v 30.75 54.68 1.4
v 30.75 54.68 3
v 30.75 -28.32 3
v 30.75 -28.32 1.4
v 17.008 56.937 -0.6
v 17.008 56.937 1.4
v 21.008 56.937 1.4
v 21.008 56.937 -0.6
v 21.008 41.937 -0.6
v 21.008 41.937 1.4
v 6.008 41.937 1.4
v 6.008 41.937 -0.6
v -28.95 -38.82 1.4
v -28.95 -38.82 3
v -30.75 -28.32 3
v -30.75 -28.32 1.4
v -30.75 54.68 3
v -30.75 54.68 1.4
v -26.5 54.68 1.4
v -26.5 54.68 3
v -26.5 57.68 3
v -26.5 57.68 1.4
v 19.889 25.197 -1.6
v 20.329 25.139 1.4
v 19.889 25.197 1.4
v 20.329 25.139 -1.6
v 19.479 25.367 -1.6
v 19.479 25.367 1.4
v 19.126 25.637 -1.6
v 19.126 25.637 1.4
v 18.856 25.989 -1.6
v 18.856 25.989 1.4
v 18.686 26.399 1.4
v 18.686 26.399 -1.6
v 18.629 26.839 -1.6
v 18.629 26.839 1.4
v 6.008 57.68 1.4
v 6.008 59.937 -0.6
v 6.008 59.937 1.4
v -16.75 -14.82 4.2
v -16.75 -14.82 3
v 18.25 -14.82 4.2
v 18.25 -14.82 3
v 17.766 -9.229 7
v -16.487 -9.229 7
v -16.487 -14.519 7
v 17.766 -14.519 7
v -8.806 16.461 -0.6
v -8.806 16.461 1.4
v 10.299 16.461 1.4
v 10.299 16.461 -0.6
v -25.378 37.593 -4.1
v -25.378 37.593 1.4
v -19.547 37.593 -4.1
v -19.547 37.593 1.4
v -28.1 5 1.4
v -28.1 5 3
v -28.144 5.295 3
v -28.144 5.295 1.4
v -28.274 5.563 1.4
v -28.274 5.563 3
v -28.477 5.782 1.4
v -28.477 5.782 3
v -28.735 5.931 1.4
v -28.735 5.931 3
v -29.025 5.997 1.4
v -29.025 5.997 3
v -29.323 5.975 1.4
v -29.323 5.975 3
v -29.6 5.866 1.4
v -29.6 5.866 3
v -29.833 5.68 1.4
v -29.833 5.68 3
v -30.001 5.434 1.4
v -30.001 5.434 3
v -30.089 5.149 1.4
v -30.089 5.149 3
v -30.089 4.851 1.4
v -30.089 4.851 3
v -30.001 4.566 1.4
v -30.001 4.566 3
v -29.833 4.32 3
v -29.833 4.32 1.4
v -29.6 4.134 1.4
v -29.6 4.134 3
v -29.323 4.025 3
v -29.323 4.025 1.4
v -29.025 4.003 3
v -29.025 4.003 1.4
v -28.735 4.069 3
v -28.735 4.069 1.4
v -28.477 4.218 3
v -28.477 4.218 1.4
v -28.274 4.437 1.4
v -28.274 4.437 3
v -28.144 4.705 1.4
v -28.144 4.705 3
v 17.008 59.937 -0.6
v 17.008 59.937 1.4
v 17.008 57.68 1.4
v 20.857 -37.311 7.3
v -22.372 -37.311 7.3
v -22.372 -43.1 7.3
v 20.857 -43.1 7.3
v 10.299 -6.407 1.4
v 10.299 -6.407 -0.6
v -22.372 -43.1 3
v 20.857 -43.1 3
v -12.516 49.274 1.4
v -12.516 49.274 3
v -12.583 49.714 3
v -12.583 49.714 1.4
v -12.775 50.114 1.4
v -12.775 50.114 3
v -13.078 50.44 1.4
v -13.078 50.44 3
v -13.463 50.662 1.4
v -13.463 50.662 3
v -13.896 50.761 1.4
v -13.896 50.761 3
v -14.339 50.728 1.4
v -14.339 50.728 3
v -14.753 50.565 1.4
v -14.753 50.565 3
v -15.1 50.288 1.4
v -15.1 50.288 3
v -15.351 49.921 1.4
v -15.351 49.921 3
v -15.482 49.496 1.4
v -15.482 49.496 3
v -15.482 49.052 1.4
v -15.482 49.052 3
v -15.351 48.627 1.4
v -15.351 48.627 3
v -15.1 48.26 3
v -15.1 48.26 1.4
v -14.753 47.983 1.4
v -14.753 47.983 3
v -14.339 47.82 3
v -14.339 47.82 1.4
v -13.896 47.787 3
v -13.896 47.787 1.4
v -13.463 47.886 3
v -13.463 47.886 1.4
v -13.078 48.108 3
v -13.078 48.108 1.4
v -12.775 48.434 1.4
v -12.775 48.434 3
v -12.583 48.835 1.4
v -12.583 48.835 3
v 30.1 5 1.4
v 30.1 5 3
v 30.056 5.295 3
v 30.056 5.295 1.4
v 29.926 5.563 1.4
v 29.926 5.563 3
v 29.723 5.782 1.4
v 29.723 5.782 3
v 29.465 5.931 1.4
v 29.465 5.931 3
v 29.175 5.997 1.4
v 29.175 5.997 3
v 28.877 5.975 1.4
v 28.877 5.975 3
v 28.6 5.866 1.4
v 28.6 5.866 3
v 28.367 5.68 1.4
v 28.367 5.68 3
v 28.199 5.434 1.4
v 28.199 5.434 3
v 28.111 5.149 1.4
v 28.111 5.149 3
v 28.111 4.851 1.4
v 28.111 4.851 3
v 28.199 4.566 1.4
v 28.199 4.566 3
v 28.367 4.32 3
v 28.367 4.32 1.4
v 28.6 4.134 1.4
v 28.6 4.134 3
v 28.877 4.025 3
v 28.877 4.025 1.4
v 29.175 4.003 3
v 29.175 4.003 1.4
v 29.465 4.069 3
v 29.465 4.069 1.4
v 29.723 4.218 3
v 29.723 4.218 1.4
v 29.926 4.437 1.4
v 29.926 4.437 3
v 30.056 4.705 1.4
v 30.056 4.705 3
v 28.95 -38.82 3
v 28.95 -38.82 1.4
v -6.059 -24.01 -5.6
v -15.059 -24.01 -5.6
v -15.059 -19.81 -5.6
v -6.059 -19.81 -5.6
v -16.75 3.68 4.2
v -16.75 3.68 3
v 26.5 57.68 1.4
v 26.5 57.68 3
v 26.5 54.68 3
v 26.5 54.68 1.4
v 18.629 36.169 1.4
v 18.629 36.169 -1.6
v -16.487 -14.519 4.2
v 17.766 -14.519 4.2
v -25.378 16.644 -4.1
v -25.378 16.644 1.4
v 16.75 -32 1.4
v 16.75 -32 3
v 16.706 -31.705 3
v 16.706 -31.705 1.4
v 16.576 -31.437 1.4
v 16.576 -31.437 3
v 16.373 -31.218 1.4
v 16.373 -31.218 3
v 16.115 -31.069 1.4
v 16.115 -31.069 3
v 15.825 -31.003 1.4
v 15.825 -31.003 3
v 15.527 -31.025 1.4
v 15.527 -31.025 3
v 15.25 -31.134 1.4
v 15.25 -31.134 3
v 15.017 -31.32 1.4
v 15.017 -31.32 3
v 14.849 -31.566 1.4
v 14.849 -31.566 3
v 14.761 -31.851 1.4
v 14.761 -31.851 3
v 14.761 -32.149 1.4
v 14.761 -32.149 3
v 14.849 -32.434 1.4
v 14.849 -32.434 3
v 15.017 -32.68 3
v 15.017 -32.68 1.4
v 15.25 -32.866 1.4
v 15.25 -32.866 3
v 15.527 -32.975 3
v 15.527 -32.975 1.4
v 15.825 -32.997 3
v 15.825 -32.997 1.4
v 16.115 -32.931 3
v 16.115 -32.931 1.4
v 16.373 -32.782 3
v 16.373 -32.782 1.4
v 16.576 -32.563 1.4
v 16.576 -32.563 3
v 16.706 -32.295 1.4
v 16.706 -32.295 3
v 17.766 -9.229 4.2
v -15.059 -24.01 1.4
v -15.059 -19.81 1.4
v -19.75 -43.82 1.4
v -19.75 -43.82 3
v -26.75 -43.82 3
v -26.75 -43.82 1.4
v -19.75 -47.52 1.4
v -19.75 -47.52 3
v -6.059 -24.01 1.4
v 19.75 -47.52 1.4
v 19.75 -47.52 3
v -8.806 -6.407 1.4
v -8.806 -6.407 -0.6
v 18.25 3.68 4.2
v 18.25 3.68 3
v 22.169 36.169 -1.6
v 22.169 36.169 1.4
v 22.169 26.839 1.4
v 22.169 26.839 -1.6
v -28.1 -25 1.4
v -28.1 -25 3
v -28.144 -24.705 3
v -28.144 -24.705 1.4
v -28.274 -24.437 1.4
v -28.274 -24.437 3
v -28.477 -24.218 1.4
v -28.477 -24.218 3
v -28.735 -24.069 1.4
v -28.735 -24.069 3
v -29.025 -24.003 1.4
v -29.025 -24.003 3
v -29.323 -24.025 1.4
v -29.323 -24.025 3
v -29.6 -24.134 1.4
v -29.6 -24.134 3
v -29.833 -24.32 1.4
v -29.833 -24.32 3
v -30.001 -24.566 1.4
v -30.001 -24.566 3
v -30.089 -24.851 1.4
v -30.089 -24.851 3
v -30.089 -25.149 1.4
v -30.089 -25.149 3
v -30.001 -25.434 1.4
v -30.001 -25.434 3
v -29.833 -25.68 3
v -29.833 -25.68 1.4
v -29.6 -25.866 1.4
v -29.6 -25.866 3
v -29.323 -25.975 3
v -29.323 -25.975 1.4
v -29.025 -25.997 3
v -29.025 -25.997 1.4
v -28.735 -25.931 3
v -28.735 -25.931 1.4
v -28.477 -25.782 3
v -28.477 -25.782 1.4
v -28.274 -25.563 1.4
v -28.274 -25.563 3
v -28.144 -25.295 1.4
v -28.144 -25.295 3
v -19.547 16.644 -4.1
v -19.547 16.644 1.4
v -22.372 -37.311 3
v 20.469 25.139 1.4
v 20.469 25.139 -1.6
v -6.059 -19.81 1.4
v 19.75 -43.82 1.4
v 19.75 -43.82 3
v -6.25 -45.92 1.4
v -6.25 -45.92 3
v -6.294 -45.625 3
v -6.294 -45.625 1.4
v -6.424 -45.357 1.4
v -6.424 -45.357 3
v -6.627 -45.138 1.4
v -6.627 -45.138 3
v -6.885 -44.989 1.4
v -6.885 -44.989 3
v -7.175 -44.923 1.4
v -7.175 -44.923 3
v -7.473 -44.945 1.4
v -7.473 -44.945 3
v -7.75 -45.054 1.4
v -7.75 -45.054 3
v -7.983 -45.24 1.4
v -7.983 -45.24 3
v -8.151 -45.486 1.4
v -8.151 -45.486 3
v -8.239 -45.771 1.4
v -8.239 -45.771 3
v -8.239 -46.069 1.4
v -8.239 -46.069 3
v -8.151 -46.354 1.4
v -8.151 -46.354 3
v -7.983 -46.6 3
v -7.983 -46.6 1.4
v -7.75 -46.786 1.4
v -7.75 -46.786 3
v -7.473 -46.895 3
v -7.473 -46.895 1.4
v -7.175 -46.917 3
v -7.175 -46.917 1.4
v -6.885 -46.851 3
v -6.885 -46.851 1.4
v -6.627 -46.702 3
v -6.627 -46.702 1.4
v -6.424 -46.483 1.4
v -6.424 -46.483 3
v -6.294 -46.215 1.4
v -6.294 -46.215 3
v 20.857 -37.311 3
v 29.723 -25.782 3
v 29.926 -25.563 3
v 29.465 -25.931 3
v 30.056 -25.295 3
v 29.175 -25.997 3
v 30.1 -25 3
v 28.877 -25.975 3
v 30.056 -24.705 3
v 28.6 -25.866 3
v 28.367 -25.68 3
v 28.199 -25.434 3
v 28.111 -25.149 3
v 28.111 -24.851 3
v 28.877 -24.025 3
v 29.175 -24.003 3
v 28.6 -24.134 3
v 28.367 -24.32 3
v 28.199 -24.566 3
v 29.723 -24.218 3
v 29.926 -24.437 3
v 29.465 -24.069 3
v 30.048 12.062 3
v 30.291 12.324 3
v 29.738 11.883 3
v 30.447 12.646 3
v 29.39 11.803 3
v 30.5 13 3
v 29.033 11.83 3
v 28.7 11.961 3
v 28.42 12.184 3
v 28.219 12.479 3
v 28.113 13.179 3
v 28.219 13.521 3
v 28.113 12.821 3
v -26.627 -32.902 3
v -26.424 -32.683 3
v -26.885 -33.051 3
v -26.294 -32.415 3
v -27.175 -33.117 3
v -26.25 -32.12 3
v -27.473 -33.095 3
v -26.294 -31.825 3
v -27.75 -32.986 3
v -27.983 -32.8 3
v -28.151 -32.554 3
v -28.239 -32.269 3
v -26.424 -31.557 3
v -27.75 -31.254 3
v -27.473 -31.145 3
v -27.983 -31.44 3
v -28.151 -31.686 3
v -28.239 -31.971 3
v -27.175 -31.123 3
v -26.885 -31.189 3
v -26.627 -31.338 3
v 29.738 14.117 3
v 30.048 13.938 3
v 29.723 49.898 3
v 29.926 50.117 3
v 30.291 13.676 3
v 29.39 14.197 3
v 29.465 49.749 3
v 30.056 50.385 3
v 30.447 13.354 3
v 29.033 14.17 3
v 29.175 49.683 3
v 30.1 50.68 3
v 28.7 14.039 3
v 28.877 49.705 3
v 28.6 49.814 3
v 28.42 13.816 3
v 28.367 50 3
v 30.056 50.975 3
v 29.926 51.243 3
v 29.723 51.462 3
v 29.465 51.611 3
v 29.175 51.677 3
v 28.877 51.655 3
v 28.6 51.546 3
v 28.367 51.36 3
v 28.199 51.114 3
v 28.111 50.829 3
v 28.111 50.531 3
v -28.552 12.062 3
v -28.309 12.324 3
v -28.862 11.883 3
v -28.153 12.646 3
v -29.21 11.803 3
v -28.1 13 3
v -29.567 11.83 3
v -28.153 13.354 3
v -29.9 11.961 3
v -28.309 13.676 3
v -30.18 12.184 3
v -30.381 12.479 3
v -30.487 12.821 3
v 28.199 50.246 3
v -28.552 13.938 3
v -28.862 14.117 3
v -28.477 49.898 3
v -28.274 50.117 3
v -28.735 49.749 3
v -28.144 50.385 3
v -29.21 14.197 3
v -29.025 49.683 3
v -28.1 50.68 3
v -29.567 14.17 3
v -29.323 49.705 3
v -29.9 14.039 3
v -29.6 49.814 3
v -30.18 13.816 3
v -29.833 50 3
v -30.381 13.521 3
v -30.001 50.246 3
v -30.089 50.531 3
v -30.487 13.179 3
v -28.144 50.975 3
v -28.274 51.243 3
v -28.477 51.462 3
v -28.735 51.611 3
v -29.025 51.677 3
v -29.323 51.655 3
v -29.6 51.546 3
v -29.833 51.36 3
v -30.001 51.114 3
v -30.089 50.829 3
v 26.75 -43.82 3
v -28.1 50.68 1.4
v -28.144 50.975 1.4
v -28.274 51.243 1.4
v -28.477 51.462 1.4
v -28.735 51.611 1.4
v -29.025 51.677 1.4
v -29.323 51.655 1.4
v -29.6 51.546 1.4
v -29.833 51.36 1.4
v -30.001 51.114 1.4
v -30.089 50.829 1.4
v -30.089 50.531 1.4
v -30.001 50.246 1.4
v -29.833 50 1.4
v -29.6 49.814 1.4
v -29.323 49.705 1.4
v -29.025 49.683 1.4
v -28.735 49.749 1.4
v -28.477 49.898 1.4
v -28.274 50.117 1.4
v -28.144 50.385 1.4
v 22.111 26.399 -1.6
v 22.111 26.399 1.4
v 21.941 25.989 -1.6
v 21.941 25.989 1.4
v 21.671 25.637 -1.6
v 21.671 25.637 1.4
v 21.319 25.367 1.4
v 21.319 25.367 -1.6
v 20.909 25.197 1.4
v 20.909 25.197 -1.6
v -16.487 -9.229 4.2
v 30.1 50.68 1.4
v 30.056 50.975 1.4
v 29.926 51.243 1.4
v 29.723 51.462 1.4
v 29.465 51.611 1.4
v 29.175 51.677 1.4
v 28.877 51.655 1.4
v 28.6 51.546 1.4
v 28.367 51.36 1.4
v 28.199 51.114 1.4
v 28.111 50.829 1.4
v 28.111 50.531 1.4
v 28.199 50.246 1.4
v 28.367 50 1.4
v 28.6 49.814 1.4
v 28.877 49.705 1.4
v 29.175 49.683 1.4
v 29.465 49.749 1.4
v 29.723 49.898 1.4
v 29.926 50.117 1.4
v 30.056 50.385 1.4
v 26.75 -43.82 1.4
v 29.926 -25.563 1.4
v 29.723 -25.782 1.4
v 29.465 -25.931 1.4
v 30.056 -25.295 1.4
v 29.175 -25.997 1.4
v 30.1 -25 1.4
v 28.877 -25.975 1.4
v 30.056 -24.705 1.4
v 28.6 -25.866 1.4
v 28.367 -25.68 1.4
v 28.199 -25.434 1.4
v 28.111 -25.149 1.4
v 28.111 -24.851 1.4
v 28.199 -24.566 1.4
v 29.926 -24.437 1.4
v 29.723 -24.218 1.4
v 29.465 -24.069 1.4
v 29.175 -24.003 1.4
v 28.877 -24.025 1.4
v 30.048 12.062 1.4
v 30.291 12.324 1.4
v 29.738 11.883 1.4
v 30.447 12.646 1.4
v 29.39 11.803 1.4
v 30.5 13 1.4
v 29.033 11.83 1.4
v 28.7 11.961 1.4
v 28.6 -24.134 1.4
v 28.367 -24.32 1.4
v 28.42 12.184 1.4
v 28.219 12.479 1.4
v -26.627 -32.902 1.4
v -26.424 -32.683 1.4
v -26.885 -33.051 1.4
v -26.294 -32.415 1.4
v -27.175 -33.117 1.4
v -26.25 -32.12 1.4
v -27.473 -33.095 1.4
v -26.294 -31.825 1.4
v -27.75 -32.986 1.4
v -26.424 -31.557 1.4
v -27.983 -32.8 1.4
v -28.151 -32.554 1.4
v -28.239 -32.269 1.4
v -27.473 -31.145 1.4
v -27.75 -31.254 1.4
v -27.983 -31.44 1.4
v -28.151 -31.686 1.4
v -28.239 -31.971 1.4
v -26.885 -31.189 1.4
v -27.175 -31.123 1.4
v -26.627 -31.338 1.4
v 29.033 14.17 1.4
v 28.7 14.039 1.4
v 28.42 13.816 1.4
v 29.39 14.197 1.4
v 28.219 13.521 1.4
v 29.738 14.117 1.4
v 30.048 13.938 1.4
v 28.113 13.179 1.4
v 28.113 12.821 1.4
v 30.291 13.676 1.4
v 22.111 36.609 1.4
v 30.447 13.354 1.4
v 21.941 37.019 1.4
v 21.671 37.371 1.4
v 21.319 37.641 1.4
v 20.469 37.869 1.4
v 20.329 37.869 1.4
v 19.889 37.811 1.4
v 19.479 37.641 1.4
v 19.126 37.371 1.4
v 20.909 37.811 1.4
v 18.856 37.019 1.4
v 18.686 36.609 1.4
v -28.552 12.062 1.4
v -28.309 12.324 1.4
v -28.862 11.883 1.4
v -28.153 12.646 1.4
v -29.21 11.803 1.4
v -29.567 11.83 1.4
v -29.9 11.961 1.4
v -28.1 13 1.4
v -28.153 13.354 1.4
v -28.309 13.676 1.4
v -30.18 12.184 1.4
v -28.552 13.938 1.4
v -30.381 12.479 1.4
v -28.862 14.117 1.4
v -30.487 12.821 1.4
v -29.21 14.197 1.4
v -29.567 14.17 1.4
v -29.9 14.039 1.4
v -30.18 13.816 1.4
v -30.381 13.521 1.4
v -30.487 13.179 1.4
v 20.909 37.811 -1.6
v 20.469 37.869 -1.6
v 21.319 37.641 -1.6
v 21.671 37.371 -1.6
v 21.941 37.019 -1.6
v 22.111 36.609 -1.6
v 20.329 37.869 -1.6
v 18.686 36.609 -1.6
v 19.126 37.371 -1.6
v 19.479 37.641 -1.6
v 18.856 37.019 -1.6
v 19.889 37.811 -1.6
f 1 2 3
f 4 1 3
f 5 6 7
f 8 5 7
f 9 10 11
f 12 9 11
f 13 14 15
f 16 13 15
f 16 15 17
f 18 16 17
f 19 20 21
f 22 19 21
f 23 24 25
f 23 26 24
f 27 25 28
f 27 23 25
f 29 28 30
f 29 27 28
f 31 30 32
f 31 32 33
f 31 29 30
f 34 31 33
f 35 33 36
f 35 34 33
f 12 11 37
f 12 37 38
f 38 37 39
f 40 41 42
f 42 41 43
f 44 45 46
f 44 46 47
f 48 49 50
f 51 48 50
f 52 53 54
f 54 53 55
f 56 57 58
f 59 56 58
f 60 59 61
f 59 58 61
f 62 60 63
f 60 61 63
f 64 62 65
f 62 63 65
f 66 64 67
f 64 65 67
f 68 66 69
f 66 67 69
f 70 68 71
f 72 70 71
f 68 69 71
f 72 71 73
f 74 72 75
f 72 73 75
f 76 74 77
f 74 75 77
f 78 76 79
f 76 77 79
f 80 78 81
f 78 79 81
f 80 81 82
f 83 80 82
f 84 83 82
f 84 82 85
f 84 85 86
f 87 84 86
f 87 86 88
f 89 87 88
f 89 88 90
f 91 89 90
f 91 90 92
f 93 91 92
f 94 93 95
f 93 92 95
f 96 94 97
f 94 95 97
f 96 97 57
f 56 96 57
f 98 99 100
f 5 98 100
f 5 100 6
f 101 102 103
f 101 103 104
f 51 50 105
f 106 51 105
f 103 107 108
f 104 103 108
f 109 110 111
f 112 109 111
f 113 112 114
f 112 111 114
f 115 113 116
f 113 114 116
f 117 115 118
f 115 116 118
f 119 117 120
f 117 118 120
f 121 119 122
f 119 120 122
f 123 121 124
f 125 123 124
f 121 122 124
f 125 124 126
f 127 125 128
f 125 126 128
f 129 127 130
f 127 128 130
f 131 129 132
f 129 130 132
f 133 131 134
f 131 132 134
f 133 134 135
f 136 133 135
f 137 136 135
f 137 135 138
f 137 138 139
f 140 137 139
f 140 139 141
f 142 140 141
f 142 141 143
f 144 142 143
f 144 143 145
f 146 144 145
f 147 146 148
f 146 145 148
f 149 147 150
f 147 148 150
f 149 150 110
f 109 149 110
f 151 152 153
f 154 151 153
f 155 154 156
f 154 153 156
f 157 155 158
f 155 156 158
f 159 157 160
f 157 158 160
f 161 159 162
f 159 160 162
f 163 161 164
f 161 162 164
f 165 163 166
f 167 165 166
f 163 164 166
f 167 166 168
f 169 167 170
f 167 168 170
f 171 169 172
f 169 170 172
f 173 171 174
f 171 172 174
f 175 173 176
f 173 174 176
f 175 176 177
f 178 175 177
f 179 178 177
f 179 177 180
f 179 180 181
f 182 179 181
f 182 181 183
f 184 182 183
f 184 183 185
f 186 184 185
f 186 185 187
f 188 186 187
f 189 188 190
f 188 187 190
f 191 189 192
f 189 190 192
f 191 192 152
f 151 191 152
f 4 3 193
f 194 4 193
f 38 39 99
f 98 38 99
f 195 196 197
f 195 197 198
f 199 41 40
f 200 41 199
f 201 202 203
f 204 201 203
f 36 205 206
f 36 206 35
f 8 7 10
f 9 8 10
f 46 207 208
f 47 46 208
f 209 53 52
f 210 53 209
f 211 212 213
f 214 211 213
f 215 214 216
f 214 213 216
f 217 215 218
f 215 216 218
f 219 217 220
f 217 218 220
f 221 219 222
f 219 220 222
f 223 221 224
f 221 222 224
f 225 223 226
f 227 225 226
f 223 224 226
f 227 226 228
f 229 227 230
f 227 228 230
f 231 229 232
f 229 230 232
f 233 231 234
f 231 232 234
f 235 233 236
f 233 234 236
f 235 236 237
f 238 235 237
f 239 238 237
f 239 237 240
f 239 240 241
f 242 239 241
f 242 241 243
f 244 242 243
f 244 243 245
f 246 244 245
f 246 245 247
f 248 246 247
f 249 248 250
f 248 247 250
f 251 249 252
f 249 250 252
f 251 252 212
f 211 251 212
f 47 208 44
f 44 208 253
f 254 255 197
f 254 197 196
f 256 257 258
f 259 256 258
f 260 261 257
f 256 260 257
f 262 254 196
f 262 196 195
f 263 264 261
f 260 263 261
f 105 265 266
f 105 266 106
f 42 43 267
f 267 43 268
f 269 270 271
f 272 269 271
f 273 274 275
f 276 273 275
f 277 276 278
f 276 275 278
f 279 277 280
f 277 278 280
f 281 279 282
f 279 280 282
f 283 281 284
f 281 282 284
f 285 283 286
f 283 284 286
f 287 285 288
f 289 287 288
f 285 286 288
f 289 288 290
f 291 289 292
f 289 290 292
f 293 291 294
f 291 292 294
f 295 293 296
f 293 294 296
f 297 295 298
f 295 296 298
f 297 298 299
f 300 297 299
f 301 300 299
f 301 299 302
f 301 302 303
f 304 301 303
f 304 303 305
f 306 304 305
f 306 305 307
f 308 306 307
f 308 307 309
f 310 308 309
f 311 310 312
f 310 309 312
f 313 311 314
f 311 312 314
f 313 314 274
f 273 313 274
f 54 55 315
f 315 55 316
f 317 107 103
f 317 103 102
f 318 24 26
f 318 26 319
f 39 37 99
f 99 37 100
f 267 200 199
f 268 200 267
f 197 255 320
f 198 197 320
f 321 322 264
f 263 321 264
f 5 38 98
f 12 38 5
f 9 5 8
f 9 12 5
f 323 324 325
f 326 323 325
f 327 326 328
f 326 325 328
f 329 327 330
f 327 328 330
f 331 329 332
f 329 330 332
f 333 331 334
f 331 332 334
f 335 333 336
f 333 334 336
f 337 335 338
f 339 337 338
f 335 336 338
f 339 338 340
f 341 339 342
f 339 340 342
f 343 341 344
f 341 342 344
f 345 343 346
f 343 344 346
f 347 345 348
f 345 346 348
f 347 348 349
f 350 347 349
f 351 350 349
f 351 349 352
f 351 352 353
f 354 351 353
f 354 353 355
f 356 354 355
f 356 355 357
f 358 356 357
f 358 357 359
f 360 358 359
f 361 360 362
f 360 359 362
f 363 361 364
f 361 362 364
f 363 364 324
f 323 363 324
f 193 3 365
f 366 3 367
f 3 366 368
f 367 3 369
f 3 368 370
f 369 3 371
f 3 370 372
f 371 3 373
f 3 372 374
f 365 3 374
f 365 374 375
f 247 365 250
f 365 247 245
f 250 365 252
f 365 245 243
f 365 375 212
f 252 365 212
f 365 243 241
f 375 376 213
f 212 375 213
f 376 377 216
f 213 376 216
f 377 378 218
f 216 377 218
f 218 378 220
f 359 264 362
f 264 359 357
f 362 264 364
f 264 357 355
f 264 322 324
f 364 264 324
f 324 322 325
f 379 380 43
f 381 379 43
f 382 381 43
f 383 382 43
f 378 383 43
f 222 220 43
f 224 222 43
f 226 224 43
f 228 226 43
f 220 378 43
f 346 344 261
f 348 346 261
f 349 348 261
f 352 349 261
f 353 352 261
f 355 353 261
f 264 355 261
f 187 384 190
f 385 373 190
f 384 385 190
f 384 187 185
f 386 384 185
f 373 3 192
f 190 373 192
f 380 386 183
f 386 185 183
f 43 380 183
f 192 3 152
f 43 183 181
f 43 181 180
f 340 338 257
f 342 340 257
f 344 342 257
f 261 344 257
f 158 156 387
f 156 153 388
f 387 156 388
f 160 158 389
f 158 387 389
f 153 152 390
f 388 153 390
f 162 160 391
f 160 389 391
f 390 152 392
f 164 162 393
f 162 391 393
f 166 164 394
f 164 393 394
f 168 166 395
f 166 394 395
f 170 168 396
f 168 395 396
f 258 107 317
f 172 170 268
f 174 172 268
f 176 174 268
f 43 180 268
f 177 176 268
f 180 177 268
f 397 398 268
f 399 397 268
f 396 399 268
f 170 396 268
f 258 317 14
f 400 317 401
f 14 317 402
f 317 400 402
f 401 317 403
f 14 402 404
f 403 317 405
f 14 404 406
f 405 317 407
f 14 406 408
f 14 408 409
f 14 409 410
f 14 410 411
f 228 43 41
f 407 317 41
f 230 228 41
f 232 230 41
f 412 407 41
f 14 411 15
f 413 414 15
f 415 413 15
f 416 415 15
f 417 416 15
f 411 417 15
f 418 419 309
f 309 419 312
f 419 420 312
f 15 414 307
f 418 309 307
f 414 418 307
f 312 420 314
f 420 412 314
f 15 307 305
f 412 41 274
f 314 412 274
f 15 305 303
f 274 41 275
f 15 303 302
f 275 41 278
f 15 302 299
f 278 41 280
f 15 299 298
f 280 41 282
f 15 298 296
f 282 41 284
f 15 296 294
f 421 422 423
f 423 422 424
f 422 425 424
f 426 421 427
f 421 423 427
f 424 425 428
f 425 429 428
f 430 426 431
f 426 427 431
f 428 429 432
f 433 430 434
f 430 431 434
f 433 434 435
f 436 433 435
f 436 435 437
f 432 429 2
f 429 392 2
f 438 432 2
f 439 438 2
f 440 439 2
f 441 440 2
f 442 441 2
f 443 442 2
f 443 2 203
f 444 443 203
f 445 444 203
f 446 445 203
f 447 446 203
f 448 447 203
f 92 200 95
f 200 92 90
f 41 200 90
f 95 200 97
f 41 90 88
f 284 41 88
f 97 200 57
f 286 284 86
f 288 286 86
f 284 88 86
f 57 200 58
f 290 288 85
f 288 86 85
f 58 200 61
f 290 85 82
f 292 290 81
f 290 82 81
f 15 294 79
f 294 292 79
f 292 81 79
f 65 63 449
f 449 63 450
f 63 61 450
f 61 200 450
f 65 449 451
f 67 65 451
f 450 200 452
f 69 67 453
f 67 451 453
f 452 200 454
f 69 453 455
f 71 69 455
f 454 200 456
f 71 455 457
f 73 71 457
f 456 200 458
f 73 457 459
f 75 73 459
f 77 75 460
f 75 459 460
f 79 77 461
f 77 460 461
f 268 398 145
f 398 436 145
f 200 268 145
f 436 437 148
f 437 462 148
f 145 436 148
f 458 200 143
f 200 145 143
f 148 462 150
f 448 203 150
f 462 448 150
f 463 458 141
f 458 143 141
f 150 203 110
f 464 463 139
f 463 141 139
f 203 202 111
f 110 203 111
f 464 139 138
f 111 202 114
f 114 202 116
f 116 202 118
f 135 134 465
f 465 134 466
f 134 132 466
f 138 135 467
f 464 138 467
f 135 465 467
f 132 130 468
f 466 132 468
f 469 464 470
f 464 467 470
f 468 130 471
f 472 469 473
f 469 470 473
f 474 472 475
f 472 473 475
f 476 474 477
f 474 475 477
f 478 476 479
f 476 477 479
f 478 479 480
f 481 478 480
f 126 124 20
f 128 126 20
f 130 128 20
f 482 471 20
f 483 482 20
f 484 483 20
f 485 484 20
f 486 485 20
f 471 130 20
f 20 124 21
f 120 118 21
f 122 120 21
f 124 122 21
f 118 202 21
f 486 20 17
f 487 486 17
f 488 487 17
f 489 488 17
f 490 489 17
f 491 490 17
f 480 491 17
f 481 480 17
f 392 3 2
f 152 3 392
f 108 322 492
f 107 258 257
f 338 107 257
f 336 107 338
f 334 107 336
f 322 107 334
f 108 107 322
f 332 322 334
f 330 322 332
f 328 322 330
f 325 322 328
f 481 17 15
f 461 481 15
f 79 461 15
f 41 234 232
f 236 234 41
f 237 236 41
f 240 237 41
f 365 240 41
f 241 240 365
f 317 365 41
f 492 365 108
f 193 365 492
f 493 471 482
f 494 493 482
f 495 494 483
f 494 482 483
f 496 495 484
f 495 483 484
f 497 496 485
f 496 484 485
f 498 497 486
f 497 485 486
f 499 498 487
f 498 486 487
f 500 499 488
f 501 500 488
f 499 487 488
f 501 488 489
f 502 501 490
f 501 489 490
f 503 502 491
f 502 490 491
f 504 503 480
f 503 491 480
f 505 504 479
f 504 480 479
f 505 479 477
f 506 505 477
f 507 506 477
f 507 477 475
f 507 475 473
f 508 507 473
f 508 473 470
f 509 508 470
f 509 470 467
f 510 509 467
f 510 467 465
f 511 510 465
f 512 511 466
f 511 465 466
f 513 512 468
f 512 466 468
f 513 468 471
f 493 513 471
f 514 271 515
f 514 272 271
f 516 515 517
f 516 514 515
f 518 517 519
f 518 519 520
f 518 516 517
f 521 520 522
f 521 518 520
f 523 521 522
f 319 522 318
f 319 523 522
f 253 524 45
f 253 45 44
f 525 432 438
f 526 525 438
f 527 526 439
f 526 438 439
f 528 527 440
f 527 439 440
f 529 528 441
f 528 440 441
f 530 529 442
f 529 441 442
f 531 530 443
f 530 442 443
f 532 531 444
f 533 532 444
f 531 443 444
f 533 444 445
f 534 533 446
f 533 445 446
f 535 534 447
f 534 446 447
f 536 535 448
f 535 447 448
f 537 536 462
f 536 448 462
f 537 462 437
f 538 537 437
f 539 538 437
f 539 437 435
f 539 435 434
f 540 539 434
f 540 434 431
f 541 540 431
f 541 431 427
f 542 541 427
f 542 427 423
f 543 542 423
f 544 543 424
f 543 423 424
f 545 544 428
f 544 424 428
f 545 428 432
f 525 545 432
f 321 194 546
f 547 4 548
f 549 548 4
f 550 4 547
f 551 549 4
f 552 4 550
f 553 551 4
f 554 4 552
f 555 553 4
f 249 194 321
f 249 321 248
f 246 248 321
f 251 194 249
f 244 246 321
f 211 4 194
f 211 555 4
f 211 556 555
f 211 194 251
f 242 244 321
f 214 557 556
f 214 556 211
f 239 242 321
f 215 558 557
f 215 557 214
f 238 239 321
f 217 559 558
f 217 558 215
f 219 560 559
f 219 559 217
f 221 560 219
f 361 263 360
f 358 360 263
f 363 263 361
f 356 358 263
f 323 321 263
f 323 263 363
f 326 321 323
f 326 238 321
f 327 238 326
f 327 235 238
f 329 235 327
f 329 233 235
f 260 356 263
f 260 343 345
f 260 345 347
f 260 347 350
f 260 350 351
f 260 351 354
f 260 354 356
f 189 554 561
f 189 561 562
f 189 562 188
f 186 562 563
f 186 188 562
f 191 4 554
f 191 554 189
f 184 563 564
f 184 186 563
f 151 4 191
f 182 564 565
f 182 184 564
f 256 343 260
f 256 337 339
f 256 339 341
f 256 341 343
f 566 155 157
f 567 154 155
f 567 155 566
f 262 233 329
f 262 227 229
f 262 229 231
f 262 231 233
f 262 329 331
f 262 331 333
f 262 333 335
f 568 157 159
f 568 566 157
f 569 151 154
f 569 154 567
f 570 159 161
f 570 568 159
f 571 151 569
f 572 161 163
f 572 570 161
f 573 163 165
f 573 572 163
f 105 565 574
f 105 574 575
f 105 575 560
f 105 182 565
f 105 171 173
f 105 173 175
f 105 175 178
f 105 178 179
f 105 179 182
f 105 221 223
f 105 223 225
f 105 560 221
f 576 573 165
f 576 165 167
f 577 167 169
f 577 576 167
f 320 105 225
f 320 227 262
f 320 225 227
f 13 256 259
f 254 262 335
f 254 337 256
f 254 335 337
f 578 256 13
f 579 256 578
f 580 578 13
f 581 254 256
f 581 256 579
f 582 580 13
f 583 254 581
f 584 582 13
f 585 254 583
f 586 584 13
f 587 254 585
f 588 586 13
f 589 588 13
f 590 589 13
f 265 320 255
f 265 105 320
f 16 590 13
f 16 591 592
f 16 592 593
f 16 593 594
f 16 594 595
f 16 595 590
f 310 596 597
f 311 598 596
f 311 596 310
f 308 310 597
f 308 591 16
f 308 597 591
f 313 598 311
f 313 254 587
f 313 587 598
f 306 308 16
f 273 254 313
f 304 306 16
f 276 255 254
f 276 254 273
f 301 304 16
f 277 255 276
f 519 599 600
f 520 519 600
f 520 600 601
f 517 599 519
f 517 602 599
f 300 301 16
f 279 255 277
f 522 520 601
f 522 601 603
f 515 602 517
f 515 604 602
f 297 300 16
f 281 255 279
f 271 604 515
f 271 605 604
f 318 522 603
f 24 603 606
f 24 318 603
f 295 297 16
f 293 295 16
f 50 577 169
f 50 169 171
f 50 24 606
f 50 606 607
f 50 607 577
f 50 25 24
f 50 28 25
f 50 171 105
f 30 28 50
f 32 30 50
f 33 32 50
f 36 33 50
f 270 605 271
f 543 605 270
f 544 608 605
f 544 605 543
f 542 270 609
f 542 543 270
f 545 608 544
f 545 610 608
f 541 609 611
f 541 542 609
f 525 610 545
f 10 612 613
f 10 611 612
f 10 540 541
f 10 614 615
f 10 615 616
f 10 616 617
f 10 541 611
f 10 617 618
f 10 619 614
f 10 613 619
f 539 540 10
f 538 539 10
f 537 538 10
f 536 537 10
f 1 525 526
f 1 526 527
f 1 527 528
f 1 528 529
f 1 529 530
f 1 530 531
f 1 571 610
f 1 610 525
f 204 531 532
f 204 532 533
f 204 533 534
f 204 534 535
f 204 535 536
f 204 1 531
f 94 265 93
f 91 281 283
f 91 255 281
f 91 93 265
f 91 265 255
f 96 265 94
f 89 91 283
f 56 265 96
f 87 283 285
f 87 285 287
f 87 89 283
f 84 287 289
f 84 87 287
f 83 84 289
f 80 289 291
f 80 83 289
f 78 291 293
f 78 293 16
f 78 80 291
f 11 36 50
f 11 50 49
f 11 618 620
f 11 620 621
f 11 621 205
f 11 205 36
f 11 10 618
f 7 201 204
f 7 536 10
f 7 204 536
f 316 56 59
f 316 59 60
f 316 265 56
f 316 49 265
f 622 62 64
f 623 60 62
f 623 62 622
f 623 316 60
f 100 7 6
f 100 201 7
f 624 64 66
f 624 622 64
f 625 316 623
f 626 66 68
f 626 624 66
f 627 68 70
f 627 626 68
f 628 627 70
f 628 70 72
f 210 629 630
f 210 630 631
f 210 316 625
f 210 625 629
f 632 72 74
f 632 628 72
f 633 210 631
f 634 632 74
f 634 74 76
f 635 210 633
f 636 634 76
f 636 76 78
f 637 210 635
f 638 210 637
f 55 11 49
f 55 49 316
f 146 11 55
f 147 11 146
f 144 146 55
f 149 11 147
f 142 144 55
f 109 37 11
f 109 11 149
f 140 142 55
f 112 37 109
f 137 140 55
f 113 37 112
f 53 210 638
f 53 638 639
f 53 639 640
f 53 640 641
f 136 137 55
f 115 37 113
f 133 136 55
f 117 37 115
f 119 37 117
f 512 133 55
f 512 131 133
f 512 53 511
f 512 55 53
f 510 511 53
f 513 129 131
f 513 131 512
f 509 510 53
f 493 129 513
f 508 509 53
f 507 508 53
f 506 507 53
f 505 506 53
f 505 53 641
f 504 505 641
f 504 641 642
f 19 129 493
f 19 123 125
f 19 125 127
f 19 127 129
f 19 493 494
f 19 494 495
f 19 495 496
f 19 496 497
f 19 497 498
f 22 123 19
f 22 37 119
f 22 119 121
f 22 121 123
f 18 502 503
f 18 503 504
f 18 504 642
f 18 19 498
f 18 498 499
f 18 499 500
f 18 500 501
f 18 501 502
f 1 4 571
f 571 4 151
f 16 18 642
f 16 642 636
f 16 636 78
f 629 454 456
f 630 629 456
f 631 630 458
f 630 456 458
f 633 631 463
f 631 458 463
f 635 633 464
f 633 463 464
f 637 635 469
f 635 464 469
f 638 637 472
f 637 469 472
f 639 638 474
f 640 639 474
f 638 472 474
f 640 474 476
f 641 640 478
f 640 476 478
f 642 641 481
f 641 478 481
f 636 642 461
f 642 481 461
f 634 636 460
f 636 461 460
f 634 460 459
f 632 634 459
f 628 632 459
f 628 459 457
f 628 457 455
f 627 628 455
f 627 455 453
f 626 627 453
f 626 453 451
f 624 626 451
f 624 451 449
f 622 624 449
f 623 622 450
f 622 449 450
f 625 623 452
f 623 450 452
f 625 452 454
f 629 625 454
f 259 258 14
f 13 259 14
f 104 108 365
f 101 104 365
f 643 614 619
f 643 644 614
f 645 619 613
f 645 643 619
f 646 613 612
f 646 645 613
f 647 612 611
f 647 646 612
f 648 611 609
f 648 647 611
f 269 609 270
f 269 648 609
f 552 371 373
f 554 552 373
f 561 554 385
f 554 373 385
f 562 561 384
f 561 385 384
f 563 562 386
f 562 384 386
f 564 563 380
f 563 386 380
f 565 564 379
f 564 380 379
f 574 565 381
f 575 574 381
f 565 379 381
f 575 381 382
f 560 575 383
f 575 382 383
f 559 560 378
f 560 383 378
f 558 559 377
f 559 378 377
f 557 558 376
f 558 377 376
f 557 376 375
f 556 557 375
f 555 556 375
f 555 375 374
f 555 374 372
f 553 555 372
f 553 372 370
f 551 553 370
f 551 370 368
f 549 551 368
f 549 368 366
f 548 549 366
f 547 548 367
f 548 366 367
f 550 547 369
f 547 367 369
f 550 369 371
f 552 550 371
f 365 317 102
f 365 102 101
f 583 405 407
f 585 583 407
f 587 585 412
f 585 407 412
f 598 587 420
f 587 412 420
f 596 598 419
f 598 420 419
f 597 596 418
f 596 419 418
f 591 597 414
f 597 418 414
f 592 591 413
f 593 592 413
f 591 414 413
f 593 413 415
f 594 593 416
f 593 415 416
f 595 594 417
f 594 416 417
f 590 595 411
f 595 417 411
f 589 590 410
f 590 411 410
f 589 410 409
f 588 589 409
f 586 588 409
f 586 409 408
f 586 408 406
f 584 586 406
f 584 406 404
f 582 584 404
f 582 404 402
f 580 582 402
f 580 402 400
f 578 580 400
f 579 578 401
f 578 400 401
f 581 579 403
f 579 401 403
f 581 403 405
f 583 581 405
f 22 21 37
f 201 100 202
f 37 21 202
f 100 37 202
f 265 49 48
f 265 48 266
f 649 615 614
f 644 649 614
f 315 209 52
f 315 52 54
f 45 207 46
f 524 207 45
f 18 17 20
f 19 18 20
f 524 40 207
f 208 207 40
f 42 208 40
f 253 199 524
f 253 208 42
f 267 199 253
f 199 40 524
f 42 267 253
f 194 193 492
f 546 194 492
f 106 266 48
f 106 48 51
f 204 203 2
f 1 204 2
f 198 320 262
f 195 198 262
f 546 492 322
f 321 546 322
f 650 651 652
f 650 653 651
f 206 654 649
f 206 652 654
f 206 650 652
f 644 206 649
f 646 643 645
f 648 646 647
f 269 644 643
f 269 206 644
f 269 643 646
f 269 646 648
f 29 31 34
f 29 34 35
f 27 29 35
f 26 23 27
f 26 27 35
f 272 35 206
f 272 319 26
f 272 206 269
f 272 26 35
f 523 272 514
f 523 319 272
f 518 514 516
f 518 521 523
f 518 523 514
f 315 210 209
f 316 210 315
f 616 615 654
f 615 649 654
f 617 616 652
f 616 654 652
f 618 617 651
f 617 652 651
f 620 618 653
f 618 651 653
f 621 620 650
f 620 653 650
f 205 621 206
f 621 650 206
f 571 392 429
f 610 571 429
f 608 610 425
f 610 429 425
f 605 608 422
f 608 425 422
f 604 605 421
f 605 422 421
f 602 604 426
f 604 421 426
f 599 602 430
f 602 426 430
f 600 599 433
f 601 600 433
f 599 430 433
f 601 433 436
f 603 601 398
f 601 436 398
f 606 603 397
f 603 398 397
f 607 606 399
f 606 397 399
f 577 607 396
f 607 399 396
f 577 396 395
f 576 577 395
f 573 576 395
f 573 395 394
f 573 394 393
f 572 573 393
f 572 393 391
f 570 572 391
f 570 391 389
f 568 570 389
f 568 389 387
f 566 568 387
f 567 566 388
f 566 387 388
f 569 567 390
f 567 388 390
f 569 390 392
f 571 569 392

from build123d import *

# Parameters (mm, degrees)
SKETCH006_R   = 1
SKETCH006_R_2 = 1.2
SKETCH006_R_3 = 1.491082
PAD002_DEPTH  = 1.6
SKETCH033_W   = 5.831177
SKETCH033_H   = 20.949042
PAD019_DEPTH  = 5.5
PAD021_DEPTH  = 2
SKETCH053_W   = 19.104945
SKETCH053_H   = 22.868039
PAD026_DEPTH  = 2
SKETCH058_W   = 43.228985
SKETCH058_H   = 5.789597
PAD028_DEPTH  = 4.3
SKETCH110_W   = 3.54
SKETCH110_H   = 12.73
PAD057_DEPTH  = 3
FILLET018_R   = 1.7
SKETCH120_W   = 9
SKETCH120_H   = 4.2
PAD060_DEPTH  = 7
SKETCH121_W   = 35
SKETCH121_H   = 18.5
PAD061_DEPTH  = 1.2
SKETCH122_W   = 34.252625
SKETCH122_H   = 5.289647
PAD062_DEPTH  = 2.8


with BuildPart() as part:
    # Sketch006 → Pad002 (new body)
    with BuildSketch(Plane.XY.offset(3)):
        Polygon((30.75, 54.68), (30.75, -28.32), (28.95, -38.82), (26.75, -43.82), (19.75, -43.82), (19.75, -47.52), (-19.75, -47.52), (-19.75, -43.82), (-26.75, -43.82), (-28.95, -38.82), (-30.75, -28.32), (-30.75, 54.68), (-26.5, 54.68), (-26.5, 57.68), (26.5, 57.68), (26.5, 54.68), align=None)
        with Locations((-27.25, -32.12)):
            Circle(SKETCH006_R, mode=Mode.SUBTRACT)
        with Locations((15.75, -32)):
            Circle(SKETCH006_R, mode=Mode.SUBTRACT)
        with Locations((29.1, 50.68)):
            Circle(SKETCH006_R, mode=Mode.SUBTRACT)
        with Locations((-29.1, 50.68)):
            Circle(SKETCH006_R, mode=Mode.SUBTRACT)
        with Locations((-29.1, 5)):
            Circle(SKETCH006_R, mode=Mode.SUBTRACT)
        with Locations((-29.3, 13)):
            Circle(SKETCH006_R_2, mode=Mode.SUBTRACT)
        with Locations((29.3, 13)):
            Circle(SKETCH006_R_2, mode=Mode.SUBTRACT)
        with Locations((29.1, 5)):
            Circle(SKETCH006_R, mode=Mode.SUBTRACT)
        with Locations((-7.25, -45.92)):
            Circle(SKETCH006_R, mode=Mode.SUBTRACT)
        with Locations((-29.1, -25)):
            Circle(SKETCH006_R, mode=Mode.SUBTRACT)
        with Locations((29.1, -25)):
            Circle(SKETCH006_R, mode=Mode.SUBTRACT)
        with Locations((-14.007447, 49.274082)):
            Circle(SKETCH006_R_3, mode=Mode.SUBTRACT)
    extrude(amount=-PAD002_DEPTH)

    # Sketch033 (on Face30 of Pad002) → Pad019 (join)
    with BuildSketch(Plane(origin=(0, 0, 1.4), x_dir=(1, 0, 0), z_dir=(0, 0, -1))):
        with Locations((-22.462421, -27.118268)):
            Rectangle(SKETCH033_W, SKETCH033_H)
    extrude(amount=PAD019_DEPTH)

    # Sketch046 (on Face5 of Pad019) → Pad021 (join)
    with BuildSketch(Plane(origin=(0, 0, 1.4), x_dir=(1, 0, 0), z_dir=(0, 0, -1))):
        Polygon((21.00816, -56.937296), (21.00816, -41.937296), (6.00816, -41.937296), (6.00816, -56.937296), (6.00816, -59.937296), (17.00816, -59.937296), (17.00816, -56.937296), align=None)
    extrude(amount=PAD021_DEPTH)

    # Sketch053 (on Face5 of Pad021) → Pad026 (join)
    with BuildSketch(Plane(origin=(0, 0, 1.4), x_dir=(1, 0, 0), z_dir=(0, 0, -1))):
        with Locations((0.746086, -5.026741)):
            Rectangle(SKETCH053_W, SKETCH053_H)
    extrude(amount=PAD026_DEPTH)

    # Sketch058 (on Face4 of Pad026) → Pad028 (join)
    with BuildSketch(Plane.XY.offset(3)):
        with Locations((-0.757428, -40.205624)):
            Rectangle(SKETCH058_W, SKETCH058_H)
    extrude(amount=PAD028_DEPTH)

    # Sketch110 (on Face5 of Pad028) → Pad057 (join)
    with BuildSketch(Plane(origin=(0, 0, 1.4), x_dir=(1, 0, 0), z_dir=(0, 0, -1))):
        with Locations((20.398529, -31.503779)):
            Rectangle(SKETCH110_W, SKETCH110_H)
    extrude(amount=PAD057_DEPTH)

    # Fillet018
    fillet018_edges = [part.edges().sort_by_distance(p)[0] for p in [
        (18.628529, 25.138779, -0.1),
        (22.168529, 25.138779, -0.1),
        (22.168529, 37.868779, -0.1),
        (18.628529, 37.868779, -0.1),
    ]]
    fillet(fillet018_edges, radius=FILLET018_R)

    # Sketch120 (on Face1 of Fillet018) → Pad060 (join)
    with BuildSketch(Plane(origin=(0, 0, 1.4), x_dir=(1, 0, 0), z_dir=(0, 0, -1))):
        with Locations((-10.558947, 21.91)):
            Rectangle(SKETCH120_W, SKETCH120_H)
    extrude(amount=PAD060_DEPTH)

    # Sketch121 (on Face56 of Pad060) → Pad061 (join)
    with BuildSketch(Plane.XY.offset(3)):
        with Locations((0.75, -5.57)):
            Rectangle(SKETCH121_W, SKETCH121_H)
    extrude(amount=PAD061_DEPTH)

    # Sketch122 (on Face72 of Pad061) → Pad062 (join)
    with BuildSketch(Plane.XY.offset(4.2)):
        with Locations((0.639808, -11.874083)):
            Rectangle(SKETCH122_W, SKETCH122_H)
    extrude(amount=PAD062_DEPTH)


solid = part.part
